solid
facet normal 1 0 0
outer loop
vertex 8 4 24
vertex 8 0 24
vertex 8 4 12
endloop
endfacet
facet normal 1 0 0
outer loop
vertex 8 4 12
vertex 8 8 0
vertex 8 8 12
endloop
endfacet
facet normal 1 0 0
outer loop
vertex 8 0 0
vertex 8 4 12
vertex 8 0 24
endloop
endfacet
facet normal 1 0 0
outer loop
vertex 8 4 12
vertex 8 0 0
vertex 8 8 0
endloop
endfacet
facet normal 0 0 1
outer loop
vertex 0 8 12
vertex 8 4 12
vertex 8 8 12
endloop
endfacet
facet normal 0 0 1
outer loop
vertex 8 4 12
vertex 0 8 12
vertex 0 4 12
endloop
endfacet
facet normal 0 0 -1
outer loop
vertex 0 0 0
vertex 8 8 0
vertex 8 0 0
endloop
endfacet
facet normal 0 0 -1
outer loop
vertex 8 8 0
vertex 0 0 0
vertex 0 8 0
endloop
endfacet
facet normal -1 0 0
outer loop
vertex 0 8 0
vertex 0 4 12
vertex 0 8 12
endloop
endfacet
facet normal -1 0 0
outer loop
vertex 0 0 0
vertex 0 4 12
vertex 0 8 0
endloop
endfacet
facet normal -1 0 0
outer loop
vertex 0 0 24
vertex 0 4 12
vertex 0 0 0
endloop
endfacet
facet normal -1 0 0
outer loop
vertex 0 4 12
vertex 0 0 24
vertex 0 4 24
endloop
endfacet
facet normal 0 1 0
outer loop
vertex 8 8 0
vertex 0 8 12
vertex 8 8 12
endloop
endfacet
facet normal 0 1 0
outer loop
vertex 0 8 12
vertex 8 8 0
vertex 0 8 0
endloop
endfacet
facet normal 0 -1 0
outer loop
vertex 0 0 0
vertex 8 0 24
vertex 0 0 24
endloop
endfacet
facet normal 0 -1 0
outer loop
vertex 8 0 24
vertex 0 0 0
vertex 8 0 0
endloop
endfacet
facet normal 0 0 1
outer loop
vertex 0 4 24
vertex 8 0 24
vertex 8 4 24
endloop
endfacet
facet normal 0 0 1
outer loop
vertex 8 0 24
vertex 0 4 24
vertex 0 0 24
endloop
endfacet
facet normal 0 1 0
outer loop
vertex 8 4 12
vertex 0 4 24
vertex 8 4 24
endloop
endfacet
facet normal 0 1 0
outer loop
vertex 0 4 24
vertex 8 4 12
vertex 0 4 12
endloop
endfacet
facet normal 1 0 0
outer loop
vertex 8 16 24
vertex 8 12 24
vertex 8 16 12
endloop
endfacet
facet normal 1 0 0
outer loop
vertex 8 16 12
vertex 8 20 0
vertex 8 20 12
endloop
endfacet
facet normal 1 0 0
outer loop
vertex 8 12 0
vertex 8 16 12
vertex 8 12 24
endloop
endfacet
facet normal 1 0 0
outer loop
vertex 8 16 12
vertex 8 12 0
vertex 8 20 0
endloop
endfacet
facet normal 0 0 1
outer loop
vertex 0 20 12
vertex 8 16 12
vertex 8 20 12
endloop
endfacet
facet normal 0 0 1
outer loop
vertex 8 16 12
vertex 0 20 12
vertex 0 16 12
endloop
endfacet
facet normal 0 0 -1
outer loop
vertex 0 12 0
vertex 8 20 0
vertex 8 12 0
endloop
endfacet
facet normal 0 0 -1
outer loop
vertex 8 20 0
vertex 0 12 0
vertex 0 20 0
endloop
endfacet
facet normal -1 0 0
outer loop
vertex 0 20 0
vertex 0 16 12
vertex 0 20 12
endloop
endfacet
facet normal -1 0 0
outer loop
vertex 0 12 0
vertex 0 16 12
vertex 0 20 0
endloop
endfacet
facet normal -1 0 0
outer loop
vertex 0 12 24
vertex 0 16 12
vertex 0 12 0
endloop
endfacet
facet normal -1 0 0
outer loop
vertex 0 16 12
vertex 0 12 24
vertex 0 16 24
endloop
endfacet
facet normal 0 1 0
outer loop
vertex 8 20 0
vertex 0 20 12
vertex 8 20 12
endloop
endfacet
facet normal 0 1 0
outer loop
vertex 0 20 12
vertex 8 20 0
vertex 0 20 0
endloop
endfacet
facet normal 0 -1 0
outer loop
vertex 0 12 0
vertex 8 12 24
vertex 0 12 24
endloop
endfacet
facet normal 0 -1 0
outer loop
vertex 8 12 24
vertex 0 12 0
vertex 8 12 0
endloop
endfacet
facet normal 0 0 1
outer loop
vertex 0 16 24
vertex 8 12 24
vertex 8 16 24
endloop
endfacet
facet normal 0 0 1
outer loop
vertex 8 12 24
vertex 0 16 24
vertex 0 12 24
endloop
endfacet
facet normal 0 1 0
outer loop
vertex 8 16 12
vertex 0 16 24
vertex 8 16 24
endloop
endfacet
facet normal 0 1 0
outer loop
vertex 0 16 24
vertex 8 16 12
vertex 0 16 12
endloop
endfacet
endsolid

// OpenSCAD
/*

Generic equipment mounting brackets
@idnorton
2023-02-15

Usage:

  lip       - Size of the lip used to hold the device (default 12mm)
  screw     - Diameter of screw hole fixings (default 4.5mm)
  thickness - Thickness of the bracket (default 4mm)
  x         - X Dimension of device fitting in bracket
  y         - Y Dimension of device fitting in bracket

Example command line usage:

  openscad -D x=125 -D y=45 -D screw=4.5 brackets.scad -o allied-telesis-g900.stl

Licenced as Creative Commons Attribution Non Commercial 3.0
See https://creativecommons.org/licenses/by-nc/3.0/

Specifically you may not sell the design or products using the design.
You're welcome to use the design to build things for your own commercial environment

*/

// Default values for CLI params
x = 0;
y = 0;
screw = 4.5;
lip = 12;
thickness = 4;

module bracket(
  x,
  y,
  thickness = thickness,
  lip = lip,
  screw = screw,
  x_offset = 0,
  ) {
    
  difference() {
    union() {
      // Outer shell
      cube(size = [x + (2*thickness),y + (2*thickness), lip], center = false);
  
      // lip for screws
      cube(size = [x + (2*thickness),thickness, (lip*2)], center = false);
    }
    
    // Remove body of device
    translate([x_offset, thickness, thickness]) {
      cube(size = [x+thickness,y,lip-thickness], center = false);
    }

    // Remove side of body for ventilation
    translate([lip, lip, 0]) {
      cube(size = [x+(2*thickness)-(2*lip),y+(2*thickness)-(2*lip),thickness], center = false);
    }
    

    // Bottom screw
    rotate([90,0,0]) {
      translate([2*lip, lip*1.25, -thickness]) {
        screw(d = screw);
      }
    }

    // Top screw
    rotate([90,0,0]) {
      translate([x-(2*lip), lip*1.25, -thickness]) {
        screw(d = screw);
      }
    }    
  }  
}

module screw(d = 4.5) {
  // Screw through hole
  cylinder(
    $fn=100,
    h=10*2,
    d=d,
    center=false
  );

  // Countersink for screw head
  cylinder(
    $fn=100,
    h=d,
    d1=10,
    d2=0,
    center=false
  );
}

// Right hand bracket
bracket(
  x = x,
  y = y,
  lip = lip
);

// Left hand bracket
translate([0, y + lip, 0]) {
  bracket(
    x = x,
    y = y,
    lip = lip,
    x_offset = 4
  );
}
